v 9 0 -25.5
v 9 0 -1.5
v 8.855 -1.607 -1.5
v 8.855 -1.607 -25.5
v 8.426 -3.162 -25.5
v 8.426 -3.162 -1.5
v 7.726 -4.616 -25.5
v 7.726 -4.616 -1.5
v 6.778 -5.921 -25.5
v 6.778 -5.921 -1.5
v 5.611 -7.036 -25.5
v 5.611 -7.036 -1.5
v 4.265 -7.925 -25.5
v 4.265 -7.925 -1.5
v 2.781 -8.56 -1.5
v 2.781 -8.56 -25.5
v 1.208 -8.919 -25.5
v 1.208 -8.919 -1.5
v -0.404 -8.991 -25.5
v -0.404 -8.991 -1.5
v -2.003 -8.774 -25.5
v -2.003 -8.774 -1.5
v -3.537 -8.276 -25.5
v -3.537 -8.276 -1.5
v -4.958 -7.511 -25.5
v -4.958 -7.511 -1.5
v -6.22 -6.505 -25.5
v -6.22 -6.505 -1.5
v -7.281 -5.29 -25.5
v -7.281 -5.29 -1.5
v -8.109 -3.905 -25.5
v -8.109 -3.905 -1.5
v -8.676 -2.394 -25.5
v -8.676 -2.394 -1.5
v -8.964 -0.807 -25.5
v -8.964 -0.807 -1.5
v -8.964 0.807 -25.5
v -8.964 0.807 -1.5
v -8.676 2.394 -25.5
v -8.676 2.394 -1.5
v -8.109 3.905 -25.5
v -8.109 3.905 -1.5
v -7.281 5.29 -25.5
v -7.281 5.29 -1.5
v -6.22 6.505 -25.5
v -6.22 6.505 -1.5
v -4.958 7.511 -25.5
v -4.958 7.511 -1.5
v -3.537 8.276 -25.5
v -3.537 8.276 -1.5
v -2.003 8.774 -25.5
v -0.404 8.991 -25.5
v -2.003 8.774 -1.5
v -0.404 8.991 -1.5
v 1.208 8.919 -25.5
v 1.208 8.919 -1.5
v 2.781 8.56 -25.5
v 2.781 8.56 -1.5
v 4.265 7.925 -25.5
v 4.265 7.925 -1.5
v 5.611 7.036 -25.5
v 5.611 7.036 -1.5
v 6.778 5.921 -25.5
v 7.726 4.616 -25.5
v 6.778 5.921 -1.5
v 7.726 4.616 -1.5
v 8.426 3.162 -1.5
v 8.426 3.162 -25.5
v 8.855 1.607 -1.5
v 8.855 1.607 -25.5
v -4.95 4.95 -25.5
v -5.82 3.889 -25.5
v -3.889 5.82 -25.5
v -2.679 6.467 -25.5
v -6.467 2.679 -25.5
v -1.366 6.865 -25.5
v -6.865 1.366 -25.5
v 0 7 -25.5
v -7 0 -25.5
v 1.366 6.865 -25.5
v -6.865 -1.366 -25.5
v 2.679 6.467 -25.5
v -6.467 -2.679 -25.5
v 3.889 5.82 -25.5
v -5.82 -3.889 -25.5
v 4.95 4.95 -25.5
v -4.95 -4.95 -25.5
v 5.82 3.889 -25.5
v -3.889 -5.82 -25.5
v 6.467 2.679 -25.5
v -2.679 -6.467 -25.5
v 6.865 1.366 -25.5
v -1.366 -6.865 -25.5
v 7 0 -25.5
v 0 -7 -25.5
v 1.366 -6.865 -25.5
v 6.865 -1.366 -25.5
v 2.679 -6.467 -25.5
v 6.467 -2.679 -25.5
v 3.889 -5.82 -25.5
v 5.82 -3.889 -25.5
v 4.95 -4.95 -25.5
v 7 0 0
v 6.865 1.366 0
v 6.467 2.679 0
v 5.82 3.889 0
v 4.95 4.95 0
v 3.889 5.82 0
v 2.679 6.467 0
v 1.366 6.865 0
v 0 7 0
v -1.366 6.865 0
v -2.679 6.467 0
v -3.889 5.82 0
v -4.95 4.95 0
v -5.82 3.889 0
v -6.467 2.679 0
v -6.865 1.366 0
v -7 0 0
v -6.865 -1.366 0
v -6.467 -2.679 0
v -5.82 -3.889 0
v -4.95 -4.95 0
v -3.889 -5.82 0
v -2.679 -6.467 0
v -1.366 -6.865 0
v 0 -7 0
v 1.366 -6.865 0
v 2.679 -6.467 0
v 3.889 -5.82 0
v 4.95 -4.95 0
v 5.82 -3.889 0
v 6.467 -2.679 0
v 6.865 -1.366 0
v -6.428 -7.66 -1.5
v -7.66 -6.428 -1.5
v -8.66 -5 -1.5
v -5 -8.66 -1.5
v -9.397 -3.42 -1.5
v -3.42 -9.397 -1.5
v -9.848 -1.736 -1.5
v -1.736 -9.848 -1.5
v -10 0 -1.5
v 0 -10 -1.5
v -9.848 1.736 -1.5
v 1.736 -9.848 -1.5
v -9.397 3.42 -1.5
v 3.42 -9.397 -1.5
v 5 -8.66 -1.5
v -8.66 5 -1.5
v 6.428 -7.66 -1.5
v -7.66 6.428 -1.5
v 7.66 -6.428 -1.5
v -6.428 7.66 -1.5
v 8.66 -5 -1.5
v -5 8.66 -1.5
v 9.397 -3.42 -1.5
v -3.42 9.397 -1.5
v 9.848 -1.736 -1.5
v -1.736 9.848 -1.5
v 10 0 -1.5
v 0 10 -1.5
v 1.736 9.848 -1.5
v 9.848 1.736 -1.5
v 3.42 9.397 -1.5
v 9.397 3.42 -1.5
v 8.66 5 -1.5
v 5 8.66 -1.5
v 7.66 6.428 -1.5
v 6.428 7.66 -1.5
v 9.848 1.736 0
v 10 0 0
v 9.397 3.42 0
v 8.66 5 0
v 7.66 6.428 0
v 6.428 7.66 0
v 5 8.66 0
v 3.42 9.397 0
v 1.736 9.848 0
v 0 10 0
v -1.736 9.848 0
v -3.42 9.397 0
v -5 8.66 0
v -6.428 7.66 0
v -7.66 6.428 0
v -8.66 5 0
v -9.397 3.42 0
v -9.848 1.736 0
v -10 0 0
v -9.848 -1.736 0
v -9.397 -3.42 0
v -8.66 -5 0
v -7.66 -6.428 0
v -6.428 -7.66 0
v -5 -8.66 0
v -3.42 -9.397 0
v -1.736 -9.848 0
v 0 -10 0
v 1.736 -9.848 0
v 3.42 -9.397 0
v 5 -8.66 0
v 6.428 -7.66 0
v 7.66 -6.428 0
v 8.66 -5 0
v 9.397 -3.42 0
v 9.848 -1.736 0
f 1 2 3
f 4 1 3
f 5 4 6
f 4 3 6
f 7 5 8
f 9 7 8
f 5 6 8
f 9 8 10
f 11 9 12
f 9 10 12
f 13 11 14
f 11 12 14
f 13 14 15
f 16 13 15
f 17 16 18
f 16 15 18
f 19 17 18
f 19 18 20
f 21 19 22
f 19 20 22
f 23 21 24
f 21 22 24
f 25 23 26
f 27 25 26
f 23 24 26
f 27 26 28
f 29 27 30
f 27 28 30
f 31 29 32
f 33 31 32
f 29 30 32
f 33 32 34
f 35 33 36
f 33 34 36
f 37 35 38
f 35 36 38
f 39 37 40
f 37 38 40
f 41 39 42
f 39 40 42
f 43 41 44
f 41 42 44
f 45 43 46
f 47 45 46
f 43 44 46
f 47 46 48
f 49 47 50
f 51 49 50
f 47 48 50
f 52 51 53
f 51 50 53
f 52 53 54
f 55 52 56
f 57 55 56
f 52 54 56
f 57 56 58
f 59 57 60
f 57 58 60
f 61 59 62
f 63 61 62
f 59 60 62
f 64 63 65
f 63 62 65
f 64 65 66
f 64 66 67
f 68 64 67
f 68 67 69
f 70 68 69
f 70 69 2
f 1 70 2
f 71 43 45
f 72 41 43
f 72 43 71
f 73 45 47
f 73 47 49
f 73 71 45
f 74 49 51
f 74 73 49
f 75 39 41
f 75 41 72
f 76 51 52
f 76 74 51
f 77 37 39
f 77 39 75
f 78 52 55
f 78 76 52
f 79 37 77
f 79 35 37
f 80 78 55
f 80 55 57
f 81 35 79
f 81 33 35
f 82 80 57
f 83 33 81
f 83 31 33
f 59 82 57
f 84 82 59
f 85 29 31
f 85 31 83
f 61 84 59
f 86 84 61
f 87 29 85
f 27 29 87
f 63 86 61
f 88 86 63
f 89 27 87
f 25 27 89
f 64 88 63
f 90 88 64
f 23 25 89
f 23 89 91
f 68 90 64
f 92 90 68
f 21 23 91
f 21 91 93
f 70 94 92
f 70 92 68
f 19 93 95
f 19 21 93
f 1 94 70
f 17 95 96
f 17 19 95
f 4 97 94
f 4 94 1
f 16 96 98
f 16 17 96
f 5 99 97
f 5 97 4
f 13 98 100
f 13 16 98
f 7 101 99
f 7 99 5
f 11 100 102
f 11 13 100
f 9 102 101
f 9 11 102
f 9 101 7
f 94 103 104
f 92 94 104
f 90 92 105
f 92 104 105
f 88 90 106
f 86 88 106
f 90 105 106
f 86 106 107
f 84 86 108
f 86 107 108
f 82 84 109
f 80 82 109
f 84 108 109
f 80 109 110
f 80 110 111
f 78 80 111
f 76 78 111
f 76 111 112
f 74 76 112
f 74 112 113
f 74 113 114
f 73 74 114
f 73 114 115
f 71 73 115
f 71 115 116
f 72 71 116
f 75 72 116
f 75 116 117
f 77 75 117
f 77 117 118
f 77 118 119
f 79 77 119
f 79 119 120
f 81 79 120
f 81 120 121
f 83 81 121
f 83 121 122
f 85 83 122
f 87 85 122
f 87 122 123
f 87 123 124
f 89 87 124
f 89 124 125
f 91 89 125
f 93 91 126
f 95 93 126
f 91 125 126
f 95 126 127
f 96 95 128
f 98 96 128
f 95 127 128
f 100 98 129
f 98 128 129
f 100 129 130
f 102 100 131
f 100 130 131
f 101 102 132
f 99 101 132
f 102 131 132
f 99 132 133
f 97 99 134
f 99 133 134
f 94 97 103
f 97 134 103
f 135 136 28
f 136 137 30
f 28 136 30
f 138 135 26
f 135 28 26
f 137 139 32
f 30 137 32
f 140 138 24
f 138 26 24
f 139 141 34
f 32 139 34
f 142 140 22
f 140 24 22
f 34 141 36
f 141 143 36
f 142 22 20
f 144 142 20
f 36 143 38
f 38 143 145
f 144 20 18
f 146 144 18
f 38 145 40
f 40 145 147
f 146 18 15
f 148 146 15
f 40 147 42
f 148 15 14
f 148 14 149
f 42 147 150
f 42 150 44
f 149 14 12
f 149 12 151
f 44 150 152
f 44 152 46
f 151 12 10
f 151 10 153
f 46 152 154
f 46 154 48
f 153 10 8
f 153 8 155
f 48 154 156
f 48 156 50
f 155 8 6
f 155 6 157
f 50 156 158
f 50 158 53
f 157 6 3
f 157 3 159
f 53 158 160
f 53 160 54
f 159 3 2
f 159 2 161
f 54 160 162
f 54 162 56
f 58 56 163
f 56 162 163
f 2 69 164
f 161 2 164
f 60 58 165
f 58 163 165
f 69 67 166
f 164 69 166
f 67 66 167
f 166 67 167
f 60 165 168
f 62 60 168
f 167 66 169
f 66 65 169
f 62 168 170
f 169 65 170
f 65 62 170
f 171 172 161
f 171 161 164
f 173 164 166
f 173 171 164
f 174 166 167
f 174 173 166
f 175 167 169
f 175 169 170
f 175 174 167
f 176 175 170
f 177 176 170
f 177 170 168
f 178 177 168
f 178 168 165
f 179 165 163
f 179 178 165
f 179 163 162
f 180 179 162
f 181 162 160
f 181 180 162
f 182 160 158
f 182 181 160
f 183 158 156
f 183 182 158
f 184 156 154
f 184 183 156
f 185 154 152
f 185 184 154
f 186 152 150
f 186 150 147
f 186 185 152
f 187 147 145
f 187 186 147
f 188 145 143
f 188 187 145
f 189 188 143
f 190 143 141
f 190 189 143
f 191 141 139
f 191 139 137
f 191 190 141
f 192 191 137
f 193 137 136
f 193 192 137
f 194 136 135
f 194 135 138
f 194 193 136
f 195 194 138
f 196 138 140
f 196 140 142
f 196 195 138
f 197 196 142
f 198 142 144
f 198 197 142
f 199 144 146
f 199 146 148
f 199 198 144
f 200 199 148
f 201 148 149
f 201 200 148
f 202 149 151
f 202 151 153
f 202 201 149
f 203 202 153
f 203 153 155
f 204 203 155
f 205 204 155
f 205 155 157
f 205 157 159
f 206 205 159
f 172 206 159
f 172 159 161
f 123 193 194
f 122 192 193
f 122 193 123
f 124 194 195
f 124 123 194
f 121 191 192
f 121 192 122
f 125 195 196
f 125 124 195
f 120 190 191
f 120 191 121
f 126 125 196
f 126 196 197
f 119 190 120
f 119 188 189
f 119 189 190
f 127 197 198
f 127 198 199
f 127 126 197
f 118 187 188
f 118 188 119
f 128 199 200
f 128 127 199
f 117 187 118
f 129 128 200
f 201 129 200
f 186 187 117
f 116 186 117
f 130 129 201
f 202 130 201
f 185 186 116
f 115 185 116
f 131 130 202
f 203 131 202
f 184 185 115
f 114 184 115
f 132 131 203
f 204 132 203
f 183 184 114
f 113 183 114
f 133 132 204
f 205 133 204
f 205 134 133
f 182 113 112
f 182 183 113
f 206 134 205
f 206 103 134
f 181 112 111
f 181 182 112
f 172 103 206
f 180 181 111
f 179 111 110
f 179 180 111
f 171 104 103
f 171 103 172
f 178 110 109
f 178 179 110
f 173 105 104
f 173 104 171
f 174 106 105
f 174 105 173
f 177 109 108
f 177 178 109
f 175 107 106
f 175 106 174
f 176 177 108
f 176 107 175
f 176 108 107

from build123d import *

# Parameters (mm, degrees)
F0_R     = 10
F1_DEPTH = 1.5
F2_R     = 9
F3_DEPTH = 24
F4_R     = 7
F5_DEPTH = 25.501


with BuildPart() as f1:
    # F0 (on Top) → F1 (new body)
    with BuildSketch(Plane.XY):
        Circle(F0_R)
    extrude(amount=-F1_DEPTH)

    # F2 (on face) → F3 (join)
    with BuildSketch(Plane(origin=(0, 0, -1.5), x_dir=(1, 0, 0), z_dir=(0, 0, -1))):
        Circle(F2_R)
    extrude(amount=F3_DEPTH)

    # F4 (on face) → F5 (cut, through all)
    with BuildSketch(Plane.XY):
        Circle(F4_R)
    extrude(amount=-F5_DEPTH, mode=Mode.SUBTRACT)


solid = f1.part
